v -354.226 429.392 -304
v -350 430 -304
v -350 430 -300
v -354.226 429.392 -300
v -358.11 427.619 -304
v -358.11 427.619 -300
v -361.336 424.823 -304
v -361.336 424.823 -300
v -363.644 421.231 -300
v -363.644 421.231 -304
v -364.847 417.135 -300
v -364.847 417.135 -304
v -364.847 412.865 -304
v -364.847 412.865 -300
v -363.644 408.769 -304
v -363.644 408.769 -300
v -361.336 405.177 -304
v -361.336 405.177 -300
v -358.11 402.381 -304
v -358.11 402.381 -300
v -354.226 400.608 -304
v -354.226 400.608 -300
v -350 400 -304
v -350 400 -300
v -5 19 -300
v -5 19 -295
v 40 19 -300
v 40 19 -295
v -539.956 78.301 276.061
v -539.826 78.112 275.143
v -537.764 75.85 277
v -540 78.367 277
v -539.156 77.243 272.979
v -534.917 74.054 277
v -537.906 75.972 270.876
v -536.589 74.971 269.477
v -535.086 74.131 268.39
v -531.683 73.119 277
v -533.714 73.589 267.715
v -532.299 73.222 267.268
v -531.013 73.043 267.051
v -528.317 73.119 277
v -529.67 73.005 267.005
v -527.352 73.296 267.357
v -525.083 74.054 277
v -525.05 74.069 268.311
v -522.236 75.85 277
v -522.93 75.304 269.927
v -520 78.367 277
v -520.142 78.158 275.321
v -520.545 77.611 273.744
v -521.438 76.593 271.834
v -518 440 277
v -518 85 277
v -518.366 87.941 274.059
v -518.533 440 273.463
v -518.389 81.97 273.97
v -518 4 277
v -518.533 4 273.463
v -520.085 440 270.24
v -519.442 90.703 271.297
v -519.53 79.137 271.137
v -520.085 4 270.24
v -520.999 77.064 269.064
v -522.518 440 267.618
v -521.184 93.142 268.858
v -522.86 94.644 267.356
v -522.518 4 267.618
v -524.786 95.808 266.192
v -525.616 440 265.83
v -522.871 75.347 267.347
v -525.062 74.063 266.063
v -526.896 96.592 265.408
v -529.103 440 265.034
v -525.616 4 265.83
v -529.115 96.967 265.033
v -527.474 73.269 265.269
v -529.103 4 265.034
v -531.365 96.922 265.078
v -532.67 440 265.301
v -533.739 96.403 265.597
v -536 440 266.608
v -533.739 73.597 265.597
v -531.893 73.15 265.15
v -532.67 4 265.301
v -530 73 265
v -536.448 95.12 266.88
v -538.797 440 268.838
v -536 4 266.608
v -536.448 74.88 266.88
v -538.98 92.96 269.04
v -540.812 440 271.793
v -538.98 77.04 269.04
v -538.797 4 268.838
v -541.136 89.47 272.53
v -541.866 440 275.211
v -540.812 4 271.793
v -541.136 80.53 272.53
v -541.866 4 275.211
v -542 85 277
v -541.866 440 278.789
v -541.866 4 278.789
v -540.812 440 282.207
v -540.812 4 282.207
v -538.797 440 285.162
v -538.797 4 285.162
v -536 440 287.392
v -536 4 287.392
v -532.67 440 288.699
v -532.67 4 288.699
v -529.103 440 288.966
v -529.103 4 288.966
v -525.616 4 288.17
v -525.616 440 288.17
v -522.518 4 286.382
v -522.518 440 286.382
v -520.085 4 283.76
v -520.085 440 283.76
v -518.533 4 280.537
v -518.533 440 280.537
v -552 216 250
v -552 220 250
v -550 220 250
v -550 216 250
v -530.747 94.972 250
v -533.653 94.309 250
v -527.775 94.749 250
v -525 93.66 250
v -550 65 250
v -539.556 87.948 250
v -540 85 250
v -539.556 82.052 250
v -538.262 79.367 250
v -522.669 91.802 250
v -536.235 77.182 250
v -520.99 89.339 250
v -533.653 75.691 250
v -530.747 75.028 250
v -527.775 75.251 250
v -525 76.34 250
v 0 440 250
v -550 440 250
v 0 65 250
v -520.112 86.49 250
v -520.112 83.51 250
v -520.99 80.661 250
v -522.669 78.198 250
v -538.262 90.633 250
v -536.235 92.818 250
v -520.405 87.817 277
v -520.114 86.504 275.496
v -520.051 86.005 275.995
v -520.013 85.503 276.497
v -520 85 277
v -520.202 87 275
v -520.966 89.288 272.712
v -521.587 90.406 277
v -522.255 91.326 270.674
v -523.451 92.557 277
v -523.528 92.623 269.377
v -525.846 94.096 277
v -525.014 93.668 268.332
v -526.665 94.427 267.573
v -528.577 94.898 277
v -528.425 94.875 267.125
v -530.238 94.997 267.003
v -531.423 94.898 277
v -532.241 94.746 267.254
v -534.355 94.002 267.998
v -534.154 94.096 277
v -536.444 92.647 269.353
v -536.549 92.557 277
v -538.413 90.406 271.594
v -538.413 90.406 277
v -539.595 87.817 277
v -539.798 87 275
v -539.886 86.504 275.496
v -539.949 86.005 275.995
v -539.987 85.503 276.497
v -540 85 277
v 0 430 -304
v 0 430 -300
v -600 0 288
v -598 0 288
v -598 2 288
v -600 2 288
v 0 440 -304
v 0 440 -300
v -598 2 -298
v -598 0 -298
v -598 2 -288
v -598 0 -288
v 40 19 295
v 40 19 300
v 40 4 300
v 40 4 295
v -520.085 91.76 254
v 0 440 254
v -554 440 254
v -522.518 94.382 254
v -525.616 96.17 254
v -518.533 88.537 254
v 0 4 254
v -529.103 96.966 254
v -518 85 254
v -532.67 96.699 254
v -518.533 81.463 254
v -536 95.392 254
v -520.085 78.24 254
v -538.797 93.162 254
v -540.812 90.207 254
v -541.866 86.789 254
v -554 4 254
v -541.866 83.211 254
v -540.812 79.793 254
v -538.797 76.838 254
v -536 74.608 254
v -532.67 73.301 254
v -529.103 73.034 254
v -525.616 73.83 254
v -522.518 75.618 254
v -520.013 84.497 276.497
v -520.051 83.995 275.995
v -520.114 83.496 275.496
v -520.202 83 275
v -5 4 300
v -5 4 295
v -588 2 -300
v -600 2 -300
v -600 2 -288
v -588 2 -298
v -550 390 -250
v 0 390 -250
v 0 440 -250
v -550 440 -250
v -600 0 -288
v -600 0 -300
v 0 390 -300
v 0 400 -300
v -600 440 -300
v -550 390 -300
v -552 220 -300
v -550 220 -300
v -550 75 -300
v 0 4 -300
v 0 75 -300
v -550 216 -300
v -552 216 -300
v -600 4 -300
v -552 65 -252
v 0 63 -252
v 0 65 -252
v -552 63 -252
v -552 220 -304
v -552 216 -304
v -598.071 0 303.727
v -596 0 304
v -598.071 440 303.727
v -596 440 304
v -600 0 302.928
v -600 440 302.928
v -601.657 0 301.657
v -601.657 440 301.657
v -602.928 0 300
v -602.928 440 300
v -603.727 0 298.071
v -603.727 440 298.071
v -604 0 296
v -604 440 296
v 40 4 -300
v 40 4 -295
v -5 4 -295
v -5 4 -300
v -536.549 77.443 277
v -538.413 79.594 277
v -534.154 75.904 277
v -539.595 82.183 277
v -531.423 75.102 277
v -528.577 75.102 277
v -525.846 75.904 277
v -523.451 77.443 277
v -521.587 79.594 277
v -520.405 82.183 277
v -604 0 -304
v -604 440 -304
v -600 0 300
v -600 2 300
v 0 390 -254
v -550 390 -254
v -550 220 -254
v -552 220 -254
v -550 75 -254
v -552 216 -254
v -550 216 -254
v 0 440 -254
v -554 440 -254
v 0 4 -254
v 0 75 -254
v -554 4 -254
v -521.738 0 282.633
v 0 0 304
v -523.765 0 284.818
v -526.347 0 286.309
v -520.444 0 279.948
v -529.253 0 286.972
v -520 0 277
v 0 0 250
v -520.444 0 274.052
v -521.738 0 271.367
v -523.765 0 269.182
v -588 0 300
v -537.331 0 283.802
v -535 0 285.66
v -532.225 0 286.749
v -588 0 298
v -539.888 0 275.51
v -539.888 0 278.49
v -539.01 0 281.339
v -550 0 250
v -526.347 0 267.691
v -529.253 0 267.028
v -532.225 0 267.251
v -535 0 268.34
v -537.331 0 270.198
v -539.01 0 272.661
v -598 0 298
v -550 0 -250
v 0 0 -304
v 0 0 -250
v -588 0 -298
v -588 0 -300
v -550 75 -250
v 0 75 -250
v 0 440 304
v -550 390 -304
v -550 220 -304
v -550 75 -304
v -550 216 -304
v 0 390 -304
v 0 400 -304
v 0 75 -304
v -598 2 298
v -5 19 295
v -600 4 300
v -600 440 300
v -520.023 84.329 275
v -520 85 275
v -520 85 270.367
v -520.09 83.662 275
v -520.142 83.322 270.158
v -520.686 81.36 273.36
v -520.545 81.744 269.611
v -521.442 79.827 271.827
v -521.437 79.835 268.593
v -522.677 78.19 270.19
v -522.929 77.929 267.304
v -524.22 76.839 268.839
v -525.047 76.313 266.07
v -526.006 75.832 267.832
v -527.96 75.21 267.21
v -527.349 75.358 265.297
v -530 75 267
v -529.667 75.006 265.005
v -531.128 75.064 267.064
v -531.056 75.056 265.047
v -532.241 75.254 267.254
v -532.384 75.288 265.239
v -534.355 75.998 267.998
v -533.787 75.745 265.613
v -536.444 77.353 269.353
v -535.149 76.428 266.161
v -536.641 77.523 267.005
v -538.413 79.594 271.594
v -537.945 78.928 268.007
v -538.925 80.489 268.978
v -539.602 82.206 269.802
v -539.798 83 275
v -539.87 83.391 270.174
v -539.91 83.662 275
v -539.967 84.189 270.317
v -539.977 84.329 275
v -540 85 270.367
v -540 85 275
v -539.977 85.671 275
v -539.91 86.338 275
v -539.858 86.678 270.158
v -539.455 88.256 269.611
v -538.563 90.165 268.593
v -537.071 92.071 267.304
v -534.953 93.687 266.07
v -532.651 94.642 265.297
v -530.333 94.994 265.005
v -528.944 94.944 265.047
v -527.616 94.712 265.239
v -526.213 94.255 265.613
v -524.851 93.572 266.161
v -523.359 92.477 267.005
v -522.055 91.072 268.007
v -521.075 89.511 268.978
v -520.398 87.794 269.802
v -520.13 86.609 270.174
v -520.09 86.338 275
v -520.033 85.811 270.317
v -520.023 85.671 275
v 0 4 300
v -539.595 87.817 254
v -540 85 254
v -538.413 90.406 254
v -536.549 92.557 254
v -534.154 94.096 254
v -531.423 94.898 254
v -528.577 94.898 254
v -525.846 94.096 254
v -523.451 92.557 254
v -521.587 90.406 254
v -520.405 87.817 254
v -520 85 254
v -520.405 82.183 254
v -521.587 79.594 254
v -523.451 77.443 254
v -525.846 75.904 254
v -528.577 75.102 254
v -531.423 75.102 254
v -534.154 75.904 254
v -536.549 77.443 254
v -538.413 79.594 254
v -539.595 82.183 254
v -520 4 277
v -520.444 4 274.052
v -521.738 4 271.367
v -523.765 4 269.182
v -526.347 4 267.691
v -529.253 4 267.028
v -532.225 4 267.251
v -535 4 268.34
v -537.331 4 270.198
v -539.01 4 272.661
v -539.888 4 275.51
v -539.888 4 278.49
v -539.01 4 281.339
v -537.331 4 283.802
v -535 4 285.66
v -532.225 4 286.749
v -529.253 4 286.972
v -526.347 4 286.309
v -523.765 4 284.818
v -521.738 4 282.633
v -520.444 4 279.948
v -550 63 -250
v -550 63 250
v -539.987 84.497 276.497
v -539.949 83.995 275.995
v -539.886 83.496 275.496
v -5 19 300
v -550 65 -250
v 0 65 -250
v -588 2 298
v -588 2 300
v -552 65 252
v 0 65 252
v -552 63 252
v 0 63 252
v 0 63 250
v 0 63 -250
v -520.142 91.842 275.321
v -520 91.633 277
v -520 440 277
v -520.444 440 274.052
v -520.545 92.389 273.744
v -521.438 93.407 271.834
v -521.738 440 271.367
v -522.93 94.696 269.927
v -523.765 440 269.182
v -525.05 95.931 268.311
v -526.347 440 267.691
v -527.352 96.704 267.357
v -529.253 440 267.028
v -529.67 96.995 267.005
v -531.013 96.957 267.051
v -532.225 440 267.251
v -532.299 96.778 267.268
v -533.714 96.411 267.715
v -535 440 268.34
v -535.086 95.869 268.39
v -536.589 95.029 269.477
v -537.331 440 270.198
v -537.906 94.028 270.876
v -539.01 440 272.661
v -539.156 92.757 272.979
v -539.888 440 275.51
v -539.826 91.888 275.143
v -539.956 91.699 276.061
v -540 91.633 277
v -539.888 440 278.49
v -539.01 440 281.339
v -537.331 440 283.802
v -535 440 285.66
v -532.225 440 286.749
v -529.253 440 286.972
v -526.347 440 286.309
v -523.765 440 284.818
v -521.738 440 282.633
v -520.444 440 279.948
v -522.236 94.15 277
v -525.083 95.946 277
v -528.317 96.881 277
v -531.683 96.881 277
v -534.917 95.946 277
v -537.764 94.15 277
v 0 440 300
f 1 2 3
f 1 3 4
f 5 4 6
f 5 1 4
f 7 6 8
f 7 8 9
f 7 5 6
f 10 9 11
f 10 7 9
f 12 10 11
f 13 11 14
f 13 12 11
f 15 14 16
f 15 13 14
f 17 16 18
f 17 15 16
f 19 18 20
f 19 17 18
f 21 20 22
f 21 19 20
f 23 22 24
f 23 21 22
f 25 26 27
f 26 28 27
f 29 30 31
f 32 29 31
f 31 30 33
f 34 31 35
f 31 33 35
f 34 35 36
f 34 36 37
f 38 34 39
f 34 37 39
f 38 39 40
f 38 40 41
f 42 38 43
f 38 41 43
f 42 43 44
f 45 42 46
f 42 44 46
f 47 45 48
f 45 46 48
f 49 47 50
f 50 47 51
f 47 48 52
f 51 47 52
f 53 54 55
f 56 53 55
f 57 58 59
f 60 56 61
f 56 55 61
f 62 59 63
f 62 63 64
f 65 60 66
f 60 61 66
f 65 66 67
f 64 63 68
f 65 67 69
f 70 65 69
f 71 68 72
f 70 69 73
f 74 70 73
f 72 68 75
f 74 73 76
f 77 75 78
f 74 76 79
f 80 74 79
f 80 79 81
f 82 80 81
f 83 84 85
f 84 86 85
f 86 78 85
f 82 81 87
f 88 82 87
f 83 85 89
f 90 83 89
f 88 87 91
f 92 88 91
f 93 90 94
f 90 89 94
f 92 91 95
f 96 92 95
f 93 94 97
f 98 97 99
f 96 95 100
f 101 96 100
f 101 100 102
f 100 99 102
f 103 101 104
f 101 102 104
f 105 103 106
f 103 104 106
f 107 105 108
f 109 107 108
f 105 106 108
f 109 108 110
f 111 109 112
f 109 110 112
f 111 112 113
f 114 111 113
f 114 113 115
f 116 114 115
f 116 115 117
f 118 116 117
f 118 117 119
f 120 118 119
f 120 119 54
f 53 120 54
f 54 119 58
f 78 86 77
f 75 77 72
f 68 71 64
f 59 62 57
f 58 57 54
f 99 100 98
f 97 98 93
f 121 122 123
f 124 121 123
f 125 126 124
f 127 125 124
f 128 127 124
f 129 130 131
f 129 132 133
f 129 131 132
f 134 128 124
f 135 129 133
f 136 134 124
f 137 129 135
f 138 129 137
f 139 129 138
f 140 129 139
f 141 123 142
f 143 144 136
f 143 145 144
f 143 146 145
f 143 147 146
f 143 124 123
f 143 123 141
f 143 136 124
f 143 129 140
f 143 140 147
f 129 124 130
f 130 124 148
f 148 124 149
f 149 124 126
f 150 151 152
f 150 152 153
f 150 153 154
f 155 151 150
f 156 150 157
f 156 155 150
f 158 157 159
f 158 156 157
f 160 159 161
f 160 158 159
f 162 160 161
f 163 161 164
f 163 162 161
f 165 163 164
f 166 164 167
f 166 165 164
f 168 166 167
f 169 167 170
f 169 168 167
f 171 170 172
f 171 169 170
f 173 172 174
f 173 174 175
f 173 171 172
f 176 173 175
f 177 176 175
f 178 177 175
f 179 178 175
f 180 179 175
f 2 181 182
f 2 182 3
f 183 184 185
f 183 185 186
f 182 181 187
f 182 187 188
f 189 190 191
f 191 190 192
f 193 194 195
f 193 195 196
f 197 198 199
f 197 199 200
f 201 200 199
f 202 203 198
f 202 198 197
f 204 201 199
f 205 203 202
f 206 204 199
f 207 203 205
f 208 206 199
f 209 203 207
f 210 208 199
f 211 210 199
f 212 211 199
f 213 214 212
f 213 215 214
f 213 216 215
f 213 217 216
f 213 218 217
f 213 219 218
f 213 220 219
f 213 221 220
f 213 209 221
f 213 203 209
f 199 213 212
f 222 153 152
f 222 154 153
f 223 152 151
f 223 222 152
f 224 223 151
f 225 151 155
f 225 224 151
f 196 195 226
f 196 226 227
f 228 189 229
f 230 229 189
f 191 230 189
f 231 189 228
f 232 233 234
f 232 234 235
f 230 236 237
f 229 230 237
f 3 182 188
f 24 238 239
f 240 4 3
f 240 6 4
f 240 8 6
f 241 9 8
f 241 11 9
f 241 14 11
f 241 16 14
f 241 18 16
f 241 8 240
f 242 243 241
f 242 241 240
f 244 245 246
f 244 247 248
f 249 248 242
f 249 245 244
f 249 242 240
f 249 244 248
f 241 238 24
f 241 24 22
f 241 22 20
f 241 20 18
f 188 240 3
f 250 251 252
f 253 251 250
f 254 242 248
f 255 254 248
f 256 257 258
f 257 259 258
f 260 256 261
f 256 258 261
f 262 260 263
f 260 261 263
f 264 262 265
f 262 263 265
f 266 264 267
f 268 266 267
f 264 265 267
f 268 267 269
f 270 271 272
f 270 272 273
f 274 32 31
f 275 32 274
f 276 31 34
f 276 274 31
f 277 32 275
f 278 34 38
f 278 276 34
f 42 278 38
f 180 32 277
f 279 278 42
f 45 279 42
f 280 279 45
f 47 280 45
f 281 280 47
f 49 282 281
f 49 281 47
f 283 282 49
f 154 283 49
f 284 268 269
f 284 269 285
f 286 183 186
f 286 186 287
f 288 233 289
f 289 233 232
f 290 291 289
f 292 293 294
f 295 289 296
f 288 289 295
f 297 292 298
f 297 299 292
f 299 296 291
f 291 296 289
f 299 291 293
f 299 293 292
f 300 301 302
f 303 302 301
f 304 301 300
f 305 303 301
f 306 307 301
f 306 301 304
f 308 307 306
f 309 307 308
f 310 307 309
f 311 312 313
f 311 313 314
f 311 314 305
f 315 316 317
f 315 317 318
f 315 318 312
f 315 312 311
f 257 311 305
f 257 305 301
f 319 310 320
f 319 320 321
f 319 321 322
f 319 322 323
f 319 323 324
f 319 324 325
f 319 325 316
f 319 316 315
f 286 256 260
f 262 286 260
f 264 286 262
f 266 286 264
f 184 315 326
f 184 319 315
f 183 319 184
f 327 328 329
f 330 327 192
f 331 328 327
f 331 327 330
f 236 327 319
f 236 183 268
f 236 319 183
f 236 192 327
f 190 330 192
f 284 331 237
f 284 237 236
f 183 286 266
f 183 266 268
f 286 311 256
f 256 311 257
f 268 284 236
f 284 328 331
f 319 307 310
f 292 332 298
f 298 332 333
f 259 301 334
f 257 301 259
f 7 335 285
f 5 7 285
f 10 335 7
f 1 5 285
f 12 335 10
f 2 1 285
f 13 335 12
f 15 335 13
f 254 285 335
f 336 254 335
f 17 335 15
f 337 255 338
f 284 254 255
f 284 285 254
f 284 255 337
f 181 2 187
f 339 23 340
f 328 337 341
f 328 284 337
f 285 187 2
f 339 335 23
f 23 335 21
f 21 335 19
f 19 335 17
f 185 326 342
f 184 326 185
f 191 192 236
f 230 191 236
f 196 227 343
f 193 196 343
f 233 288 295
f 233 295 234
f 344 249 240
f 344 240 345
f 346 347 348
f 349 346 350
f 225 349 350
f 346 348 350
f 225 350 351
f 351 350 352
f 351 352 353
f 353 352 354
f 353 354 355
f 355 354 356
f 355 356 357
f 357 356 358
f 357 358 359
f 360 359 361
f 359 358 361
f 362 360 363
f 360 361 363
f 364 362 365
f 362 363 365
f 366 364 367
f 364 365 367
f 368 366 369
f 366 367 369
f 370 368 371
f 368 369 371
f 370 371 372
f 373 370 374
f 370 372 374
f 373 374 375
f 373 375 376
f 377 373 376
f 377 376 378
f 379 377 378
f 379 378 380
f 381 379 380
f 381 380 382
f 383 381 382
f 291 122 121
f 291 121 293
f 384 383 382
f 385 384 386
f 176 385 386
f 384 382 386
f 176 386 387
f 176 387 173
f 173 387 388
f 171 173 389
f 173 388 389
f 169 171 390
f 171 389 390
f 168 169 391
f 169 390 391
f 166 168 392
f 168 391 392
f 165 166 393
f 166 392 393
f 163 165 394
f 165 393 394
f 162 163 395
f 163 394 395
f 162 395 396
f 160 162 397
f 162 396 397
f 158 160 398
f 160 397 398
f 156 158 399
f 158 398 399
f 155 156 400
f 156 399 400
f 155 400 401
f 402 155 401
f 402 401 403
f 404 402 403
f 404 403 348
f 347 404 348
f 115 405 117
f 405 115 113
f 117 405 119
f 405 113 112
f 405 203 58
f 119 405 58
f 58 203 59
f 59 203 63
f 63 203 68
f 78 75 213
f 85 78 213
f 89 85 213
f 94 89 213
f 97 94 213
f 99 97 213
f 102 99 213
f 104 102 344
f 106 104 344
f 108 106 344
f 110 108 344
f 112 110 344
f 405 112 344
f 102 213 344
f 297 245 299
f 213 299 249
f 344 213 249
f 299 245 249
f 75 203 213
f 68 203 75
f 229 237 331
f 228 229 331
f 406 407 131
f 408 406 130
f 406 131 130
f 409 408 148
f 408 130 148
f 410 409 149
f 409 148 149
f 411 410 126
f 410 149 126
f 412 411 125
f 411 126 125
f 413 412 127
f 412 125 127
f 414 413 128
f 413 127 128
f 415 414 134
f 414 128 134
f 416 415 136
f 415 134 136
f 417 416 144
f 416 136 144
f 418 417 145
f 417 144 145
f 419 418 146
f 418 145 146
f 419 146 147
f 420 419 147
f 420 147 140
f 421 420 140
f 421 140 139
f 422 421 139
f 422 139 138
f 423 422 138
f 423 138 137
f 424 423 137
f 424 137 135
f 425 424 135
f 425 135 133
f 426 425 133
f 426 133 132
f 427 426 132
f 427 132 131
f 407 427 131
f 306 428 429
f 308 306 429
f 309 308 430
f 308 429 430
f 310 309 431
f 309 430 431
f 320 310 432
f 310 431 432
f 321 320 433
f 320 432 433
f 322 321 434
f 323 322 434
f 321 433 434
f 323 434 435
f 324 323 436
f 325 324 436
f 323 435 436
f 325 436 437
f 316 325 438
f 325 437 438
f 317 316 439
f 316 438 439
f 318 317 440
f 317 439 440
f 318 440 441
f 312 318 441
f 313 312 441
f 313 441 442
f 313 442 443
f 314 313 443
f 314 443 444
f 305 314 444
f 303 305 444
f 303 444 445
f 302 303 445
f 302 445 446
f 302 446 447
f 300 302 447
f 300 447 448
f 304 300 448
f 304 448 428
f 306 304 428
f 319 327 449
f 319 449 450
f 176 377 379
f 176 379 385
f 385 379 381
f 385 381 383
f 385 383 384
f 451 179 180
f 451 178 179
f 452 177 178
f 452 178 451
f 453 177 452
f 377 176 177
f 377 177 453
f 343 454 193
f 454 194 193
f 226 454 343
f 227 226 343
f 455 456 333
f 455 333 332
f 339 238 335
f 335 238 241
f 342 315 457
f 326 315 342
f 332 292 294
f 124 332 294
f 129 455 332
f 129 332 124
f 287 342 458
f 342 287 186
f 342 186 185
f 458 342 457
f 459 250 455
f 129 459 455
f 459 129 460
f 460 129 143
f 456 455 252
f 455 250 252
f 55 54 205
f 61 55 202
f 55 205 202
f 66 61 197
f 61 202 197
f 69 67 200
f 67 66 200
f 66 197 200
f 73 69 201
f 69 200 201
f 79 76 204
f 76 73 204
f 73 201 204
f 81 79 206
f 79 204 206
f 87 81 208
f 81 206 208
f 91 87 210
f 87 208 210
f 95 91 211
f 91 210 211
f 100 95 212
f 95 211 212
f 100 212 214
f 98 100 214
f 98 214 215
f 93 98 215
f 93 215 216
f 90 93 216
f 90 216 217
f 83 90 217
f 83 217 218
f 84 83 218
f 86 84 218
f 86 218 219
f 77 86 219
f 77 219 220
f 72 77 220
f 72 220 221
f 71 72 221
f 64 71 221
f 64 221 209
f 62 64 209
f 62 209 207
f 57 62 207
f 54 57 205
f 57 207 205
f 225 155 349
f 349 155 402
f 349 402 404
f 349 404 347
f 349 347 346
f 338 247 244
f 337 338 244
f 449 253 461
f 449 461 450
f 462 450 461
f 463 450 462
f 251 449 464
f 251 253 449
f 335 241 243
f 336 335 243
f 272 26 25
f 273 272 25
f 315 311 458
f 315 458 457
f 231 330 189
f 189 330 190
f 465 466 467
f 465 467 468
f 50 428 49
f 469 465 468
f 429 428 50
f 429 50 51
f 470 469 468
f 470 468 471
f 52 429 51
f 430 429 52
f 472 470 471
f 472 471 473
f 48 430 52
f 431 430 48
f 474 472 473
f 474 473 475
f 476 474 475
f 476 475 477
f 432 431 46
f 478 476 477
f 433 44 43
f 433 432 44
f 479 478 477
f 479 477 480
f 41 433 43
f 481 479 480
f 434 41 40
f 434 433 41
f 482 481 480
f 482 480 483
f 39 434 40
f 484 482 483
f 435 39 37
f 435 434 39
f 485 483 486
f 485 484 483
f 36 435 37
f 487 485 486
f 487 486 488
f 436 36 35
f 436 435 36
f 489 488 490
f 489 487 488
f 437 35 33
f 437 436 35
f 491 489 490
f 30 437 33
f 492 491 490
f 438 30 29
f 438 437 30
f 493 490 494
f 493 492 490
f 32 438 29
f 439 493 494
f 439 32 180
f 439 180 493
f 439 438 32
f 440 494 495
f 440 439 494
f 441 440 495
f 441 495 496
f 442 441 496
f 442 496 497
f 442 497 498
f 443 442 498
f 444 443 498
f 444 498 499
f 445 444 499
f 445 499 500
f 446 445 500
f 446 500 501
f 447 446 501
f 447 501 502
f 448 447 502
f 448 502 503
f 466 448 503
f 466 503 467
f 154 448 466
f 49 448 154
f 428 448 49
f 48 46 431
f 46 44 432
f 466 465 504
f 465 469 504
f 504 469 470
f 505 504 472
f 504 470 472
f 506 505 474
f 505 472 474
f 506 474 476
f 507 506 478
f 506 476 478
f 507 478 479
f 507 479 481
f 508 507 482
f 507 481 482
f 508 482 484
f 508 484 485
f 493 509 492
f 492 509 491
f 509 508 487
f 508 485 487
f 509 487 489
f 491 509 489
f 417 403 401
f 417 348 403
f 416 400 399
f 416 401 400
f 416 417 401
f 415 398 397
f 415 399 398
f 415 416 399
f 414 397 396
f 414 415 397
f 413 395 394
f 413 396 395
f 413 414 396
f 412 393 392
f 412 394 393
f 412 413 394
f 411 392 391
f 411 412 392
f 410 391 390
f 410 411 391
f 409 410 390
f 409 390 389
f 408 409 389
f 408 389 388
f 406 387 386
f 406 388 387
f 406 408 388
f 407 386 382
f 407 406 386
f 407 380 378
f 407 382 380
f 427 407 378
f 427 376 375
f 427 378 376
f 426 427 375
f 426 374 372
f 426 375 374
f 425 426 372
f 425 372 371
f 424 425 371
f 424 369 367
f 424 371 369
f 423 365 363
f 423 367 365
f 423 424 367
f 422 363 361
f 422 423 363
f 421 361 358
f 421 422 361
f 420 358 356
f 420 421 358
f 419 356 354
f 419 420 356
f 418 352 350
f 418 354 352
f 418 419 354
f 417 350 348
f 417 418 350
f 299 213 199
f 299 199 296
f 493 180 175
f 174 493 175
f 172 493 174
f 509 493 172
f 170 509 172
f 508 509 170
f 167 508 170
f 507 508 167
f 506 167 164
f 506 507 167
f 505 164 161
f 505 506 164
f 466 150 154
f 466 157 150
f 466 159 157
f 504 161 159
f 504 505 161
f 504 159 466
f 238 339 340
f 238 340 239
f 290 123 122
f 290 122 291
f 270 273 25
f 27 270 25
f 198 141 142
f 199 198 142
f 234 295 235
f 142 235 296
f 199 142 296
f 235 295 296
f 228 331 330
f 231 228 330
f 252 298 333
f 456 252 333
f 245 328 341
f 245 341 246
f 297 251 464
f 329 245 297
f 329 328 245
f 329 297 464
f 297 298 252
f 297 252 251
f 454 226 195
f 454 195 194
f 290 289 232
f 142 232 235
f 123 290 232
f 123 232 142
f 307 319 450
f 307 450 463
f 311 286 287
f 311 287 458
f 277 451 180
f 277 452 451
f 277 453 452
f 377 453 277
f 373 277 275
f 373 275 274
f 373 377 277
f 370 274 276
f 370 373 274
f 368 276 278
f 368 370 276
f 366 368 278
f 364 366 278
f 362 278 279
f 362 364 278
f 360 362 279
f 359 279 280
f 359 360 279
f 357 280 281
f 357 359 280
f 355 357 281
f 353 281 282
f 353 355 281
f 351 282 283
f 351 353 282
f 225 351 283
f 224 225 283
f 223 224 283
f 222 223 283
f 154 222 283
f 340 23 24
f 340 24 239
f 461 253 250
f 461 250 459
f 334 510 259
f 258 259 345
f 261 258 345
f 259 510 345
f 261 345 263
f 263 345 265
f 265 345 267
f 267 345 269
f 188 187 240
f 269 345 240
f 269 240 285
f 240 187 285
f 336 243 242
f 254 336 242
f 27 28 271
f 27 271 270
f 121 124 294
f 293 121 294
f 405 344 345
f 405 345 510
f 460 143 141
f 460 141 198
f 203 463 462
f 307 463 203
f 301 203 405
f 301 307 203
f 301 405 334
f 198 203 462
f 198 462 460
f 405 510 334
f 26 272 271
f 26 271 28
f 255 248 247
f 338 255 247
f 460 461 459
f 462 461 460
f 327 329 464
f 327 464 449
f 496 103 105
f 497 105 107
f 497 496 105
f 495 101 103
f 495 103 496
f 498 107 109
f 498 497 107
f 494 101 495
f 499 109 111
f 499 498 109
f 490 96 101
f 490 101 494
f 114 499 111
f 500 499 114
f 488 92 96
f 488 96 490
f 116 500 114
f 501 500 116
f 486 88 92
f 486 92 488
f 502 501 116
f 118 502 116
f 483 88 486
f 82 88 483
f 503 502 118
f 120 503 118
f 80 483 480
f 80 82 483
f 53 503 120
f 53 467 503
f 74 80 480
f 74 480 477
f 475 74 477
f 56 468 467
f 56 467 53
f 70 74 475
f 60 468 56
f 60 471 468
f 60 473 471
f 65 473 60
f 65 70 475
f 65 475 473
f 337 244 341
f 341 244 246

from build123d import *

# Parameters (mm, degrees)
BOSS_EXTRUDE1_DEPTH      = 440
BOSS_EXTRUDE2_DEPTH      = 440
BOSS_EXTRUDE3_DEPTH      = 4
SKETCH4_W                = 500
SKETCH4_H                = 4
CUT_EXTRUDE1_DEPTH       = 2
CUT_EXTRUDE3_DEPTH       = 1
CUT_EXTRUDE3_DEPTH_BACK  = 1
SKETCH12_W               = 5
SKETCH12_H               = 15
BOSS_EXTRUDE4_DEPTH      = 40
BOSS_EXTRUDE4_DEPTH_BACK = 5
SKETCH11_W               = 5
SKETCH11_H               = 15
BOSS_EXTRUDE5_DEPTH      = 40
BOSS_EXTRUDE5_DEPTH_BACK = 5
CUT_EXTRUDE5_START       = -54
CUT_EXTRUDE5_DEPTH       = 54
CUT_EXTRUDE6_DEPTH       = 4
FILLET1_R                = 8
CUT_EXTRUDE7_DEPTH       = 2
SKETCH17_R               = 10
CUT_EXTRUDE8_DEPTH       = 10
SKETCH18_R               = 12
SKETCH18_R_2             = 10
BOSS_EXTRUDE6_DEPTH      = 436
SKETCH19_R               = 10
CUT_EXTRUDE9_DEPTH       = 25
SKETCH20_R               = 12
SKETCH20_R_2             = 10
BOSS_EXTRUDE7_DEPTH      = 23


with BuildPart() as part:
    # Sketch1 → Boss-Extrude1 (new body)
    with BuildSketch(Plane(origin=(0, 0, 0), x_dir=(1, 0, 0), z_dir=(0, 1, 0))):
        Polygon((0, 300), (-600, 300), (-600, -300), (0, -300), (0, -304), (-604, -304), (-604, 304), (0, 304), align=None)
    extrude(amount=BOSS_EXTRUDE1_DEPTH)



with BuildPart() as body_2:
    # Sketch2 → Boss-Extrude2 (new body)
    with BuildSketch(Plane(origin=(0, 0, 0), x_dir=(1, 0, 0), z_dir=(0, 1, 0))):
        Polygon((0, 250), (-550, 250), (-550, -250), (0, -250), (0, -254), (-554, -254), (-554, 254), (0, 254), align=None)
    extrude(amount=BOSS_EXTRUDE2_DEPTH)


with BuildPart() as part_1:
    add(part.part)

    add(body_2.part)  # Boss-Extrude3 merges body 2
    # Sketch3 → Boss-Extrude3 (add)
    with BuildSketch(Plane(origin=(0, 0, 0), x_dir=(1, 0, 0), z_dir=(0, 1, 0))):
        Polygon((0, -254), (0, -300), (-600, -300), (-600, 300), (0, 300), (0, 254), (-554, 254), (-554, -254), align=None)
    extrude(amount=BOSS_EXTRUDE3_DEPTH)

    # Sketch4 → Cut-Extrude1 (cut)
    with BuildSketch(Plane(origin=(-550, 0, 0), x_dir=(0, 0, -1), z_dir=(1, 0, 0))):
        with Locations((0, 218)):
            Rectangle(SKETCH4_W, SKETCH4_H)
    extrude(amount=-CUT_EXTRUDE1_DEPTH, mode=Mode.SUBTRACT)

    # Sketch7 → Cut-Extrude3 (cut, two sides)
    with BuildSketch(Plane(origin=(0, 64, 0), x_dir=(1, 0, 0), z_dir=(0, 1, 0))) as cut_extrude3_sk:
        Polygon((-550, 250), (0, 250), (0, 252), (-552, 252), (-552, -252), (0, -252), (0, -250), (-550, -250), align=None)
    extrude(amount=CUT_EXTRUDE3_DEPTH, mode=Mode.SUBTRACT)
    extrude(cut_extrude3_sk.sketch, amount=-CUT_EXTRUDE3_DEPTH_BACK, mode=Mode.SUBTRACT)

    # Sketch13 → Cut-Extrude5 (cut)
    with BuildSketch(Plane(origin=(0, 0, -304), x_dir=(-1, 0, 0), z_dir=(0, 0, -1)).offset(CUT_EXTRUDE5_START)):
        Polygon((0, 390), (550, 390), (550, 220), (552, 220), (552, 216), (550, 216), (550, 75), (0, 75), align=None)
    extrude(amount=CUT_EXTRUDE5_DEPTH, mode=Mode.SUBTRACT)

    # Sketch14 → Cut-Extrude6 (cut)
    with BuildSketch(Plane(origin=(0, 0, -304), x_dir=(-1, 0, 0), z_dir=(0, 0, -1))):
        with BuildLine():
            Line((0, 400), (0, 430))
            Line((0, 430), (350, 430))
            ThreePointArc((350, 430), (365, 415), (350, 400))
            Line((350, 400), (0, 400))
        make_face()
    extrude(amount=-CUT_EXTRUDE6_DEPTH, mode=Mode.SUBTRACT)

    # Fillet1
    fillet1_edges = [part_1.edges().sort_by_distance(p)[0] for p in [
        (-604, 220, 304),
    ]]
    fillet(fillet1_edges, radius=FILLET1_R)

    # Sketch15 → Cut-Extrude7 (cut)
    with BuildSketch(Plane.XZ):
        Polygon((-600, -300), (-588, -300), (-588, -298), (-598, -298), (-598, -288), (-600, -288), align=None)
    cut_extrude7 = extrude(amount=-CUT_EXTRUDE7_DEPTH, mode=Mode.SUBTRACT)

    # Mirror1: Cut-Extrude7 across plane
    add(cut_extrude7.mirror(Plane.XY), mode=Mode.SUBTRACT)

    # Sketch17 → Cut-Extrude8 (cut)
    with BuildSketch(Plane(origin=(0, 4, 0), x_dir=(1, 0, 0), z_dir=(0, 1, 0))):
        with Locations((-530, -277)):
            Circle(SKETCH17_R)
    extrude(amount=-CUT_EXTRUDE8_DEPTH, mode=Mode.SUBTRACT)

    # Sketch18 → Boss-Extrude6 (add)
    with BuildSketch(Plane(origin=(0, 4, 0), x_dir=(1, 0, 0), z_dir=(0, 1, 0))):
        with Locations((-530, -277)):
            Circle(SKETCH18_R)
        with Locations((-530, -277)):
            Circle(SKETCH18_R_2, mode=Mode.SUBTRACT)
    extrude(amount=BOSS_EXTRUDE6_DEPTH)

    # Sketch19 → Cut-Extrude9 (cut)
    with BuildSketch(Plane(origin=(0, 0, 250), x_dir=(-1, 0, 0), z_dir=(0, 0, -1))):
        with Locations((530, 85)):
            Circle(SKETCH19_R)
    extrude(amount=-CUT_EXTRUDE9_DEPTH, mode=Mode.SUBTRACT)

    # Sketch20 → Boss-Extrude7 (add)
    with BuildSketch(Plane.XY.offset(254)):
        with Locations((-530, 85)):
            Circle(SKETCH20_R)
        with Locations((-530, 85)):
            Circle(SKETCH20_R_2, mode=Mode.SUBTRACT)
    extrude(amount=BOSS_EXTRUDE7_DEPTH)


with BuildPart() as body_2_2:
    # Sketch12 → Boss-Extrude4 (new body, two sides)
    with BuildSketch(Plane(origin=(0, 0, 0), x_dir=(0, 0, -1), z_dir=(1, 0, 0))) as boss_extrude4_sk:
        with Locations((297.5, 11.5)):
            Rectangle(SKETCH12_W, SKETCH12_H)
    extrude(amount=BOSS_EXTRUDE4_DEPTH)
    extrude(boss_extrude4_sk.sketch, amount=-BOSS_EXTRUDE4_DEPTH_BACK)


with BuildPart() as body_3:
    # Sketch11 → Boss-Extrude5 (new body, two sides)
    with BuildSketch(Plane(origin=(0, 0, 0), x_dir=(0, 0, -1), z_dir=(1, 0, 0))) as boss_extrude5_sk:
        with Locations((-297.5, 11.5)):
            Rectangle(SKETCH11_W, SKETCH11_H)
    extrude(amount=BOSS_EXTRUDE5_DEPTH)
    extrude(boss_extrude5_sk.sketch, amount=-BOSS_EXTRUDE5_DEPTH_BACK)


solid = Compound([part_1.part, body_2_2.part, body_3.part])
